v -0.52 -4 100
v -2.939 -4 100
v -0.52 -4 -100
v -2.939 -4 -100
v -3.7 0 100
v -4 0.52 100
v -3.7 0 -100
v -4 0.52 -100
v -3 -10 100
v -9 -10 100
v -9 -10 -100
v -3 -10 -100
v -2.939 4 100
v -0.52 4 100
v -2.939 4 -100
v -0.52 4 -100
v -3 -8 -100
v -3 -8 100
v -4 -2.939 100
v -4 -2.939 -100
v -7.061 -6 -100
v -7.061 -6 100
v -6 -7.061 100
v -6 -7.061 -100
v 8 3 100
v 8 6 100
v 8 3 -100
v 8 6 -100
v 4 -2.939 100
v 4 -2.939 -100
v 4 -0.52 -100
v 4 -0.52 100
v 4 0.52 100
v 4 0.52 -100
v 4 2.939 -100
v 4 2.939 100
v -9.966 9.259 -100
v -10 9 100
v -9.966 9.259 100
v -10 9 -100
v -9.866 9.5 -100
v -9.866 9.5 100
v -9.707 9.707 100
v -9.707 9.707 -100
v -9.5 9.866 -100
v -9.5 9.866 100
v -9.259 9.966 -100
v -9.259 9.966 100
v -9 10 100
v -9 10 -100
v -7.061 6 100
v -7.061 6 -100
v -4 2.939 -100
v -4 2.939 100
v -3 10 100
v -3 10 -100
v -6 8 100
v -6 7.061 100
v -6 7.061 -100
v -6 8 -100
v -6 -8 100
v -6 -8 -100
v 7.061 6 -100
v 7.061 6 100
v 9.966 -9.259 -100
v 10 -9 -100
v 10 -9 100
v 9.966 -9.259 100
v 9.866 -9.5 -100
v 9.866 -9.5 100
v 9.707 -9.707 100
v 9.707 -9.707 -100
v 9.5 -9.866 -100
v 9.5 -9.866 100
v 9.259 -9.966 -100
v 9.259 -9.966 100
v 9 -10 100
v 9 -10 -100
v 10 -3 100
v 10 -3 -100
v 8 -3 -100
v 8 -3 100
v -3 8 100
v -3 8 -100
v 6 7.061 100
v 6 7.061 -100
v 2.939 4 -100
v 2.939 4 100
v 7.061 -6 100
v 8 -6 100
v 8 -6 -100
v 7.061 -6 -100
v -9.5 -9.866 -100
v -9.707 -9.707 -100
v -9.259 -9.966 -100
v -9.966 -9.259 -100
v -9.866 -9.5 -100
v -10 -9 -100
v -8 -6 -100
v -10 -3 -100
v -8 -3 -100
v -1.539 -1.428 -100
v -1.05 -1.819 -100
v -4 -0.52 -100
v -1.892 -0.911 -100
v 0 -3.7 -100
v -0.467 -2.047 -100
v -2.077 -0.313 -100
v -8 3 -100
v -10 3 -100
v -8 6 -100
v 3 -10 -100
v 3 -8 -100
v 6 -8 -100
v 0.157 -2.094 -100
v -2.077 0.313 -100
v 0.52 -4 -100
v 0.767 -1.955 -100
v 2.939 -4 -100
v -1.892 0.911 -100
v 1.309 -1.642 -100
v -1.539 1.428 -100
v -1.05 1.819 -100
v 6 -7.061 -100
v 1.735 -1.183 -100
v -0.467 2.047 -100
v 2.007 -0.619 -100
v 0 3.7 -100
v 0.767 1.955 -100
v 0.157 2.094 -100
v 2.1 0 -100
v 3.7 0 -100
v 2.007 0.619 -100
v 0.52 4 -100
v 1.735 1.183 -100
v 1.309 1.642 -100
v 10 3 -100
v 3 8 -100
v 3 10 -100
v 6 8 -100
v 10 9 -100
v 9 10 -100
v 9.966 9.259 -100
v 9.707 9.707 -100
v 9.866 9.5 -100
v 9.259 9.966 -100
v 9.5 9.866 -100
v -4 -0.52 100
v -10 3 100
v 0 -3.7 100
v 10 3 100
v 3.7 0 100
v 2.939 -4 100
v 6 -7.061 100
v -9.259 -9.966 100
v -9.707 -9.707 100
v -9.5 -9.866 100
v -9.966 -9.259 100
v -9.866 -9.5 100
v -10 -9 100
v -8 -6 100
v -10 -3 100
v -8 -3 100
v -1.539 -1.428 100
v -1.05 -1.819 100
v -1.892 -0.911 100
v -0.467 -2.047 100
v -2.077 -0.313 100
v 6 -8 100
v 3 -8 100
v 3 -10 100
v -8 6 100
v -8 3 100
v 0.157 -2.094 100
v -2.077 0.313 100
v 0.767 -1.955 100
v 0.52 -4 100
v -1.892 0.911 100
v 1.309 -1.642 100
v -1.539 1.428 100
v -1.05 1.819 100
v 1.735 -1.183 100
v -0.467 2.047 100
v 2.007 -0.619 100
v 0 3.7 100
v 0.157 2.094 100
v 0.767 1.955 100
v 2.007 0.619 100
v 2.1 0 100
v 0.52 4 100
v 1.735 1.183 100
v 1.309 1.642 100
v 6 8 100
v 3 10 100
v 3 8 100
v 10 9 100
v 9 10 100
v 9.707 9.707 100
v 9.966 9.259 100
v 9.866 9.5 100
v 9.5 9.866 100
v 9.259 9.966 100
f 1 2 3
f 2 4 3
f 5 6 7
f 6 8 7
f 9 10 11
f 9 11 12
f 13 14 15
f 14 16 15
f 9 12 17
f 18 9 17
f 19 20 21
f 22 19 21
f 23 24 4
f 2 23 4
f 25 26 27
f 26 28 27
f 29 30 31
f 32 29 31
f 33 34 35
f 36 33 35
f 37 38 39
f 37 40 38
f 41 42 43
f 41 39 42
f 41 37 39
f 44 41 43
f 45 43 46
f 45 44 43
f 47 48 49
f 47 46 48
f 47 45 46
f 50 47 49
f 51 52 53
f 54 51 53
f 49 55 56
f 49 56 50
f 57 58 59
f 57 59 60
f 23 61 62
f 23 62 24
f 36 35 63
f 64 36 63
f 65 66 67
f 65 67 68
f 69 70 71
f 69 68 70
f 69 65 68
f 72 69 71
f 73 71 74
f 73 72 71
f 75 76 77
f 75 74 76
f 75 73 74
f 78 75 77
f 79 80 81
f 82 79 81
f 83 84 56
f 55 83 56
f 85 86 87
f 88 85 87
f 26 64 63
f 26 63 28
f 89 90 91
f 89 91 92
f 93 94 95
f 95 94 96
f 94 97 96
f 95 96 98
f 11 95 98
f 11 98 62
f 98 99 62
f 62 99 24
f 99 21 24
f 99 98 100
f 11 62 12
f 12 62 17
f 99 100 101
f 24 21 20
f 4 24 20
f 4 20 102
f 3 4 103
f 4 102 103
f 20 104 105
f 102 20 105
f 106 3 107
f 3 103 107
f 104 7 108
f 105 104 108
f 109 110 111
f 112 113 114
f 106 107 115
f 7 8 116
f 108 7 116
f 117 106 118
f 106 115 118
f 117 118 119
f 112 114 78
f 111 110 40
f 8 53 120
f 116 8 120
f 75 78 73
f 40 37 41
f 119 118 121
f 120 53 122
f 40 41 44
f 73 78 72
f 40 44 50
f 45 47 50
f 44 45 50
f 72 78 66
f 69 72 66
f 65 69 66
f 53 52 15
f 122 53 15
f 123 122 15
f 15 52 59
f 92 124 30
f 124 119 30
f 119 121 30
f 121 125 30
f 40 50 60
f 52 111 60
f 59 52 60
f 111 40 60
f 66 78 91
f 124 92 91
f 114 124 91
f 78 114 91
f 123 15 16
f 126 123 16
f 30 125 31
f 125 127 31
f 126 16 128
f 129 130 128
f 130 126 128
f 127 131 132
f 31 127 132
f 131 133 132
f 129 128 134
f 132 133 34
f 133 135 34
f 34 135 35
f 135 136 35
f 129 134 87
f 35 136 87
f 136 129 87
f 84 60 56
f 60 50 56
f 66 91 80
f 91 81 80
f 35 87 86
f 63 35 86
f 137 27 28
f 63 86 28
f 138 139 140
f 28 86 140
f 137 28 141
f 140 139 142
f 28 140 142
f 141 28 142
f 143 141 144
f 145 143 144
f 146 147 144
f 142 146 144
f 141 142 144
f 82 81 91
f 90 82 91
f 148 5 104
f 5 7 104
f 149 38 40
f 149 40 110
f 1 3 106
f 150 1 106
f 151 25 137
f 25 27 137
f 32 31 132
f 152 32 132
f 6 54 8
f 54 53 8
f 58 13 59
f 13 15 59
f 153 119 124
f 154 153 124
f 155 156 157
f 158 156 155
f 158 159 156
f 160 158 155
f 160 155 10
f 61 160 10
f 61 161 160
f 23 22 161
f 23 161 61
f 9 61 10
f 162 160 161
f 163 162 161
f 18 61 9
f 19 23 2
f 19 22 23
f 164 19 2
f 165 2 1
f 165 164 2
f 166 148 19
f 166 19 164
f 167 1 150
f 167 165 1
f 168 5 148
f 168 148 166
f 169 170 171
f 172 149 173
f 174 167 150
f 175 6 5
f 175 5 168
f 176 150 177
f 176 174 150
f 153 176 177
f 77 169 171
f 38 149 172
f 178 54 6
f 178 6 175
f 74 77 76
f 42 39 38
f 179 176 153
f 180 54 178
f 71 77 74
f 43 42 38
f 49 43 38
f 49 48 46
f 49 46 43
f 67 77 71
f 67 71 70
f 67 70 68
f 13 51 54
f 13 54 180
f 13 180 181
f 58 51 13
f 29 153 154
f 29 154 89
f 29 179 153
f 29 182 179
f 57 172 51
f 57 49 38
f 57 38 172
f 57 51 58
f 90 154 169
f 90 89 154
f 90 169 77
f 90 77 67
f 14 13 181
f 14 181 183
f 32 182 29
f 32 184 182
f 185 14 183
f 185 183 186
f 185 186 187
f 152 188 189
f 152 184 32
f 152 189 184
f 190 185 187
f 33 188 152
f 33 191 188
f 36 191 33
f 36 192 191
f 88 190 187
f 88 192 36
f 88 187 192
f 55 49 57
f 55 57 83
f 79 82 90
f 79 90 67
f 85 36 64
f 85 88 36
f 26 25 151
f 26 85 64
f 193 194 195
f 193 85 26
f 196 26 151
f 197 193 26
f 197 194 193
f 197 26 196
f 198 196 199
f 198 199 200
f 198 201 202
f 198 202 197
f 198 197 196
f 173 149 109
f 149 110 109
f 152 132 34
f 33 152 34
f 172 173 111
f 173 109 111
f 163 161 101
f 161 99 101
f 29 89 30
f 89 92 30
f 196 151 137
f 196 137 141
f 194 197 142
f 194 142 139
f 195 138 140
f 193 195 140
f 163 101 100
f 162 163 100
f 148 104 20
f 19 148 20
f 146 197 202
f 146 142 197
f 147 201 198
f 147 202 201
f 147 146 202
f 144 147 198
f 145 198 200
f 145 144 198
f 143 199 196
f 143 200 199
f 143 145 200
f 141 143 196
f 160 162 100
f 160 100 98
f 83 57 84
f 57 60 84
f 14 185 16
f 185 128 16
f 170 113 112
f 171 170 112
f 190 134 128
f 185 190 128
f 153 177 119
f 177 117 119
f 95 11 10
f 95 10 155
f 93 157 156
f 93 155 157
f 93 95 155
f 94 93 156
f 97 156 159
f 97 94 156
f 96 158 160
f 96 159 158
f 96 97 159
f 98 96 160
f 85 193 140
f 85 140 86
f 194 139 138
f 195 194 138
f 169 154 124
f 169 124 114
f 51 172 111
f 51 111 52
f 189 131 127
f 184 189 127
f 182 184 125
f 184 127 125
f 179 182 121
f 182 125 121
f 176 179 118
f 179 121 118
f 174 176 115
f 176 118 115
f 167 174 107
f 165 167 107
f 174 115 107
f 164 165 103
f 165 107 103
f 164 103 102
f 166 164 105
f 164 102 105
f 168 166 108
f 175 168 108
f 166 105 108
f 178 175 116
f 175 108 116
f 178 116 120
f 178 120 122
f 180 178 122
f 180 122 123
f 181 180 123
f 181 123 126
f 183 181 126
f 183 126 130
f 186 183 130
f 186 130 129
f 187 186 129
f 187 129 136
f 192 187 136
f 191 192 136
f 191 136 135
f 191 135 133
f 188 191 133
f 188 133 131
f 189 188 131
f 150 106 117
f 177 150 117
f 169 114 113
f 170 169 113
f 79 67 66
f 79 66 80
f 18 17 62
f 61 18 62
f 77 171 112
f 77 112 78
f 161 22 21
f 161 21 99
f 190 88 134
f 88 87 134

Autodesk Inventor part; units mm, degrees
ref_plane "YZ Plane" through (0, 0, 0) normal (1, 0, 0) x (0, 1, 0)
ref_plane "XZ Plane" through (0, 0, 0) normal (0, 1, 0) x (-1, 0, 0)
ref_plane "XY Plane" through (0, 0, 0) normal (0, 0, 1) x (1, 0, 0)
sketch "Sketch1" plane through (0, 0, 0) normal (0, 0, 1) x (1, 0, 0)
  line L0 (-2.205, 0) -> (2.205, 0)
  line L1 (0, -2.205) -> (0, 2.205)
  arc A0 (9, -10) -> (10, -9) centre (9, -9) ccw
  line L2 (-10, 9) -> (-10, 3)
  line L3 (-10, 3) -> (-8, 3)
  line L4 (-8, 3) -> (-8, 6)
  line L5 (-8, 6) -> (-7.0607, 6)
  line L6 (-7.0607, 6) -> (-4, 2.9393)
  line L7 (-4, 2.9393) -> (-4, 0.5196)
  line L8 (-4, 0.5196) -> (-3.7, 0)
  line L9 (-3.7, 0) -> (-4, -0.5196)
  line L10 (-4, -0.5196) -> (-4, -2.9393)
  line L11 (-4, -2.9393) -> (-7.0607, -6)
  line L12 (-7.0607, -6) -> (-8, -6)
  line L13 (-8, -6) -> (-8, -3)
  line L14 (-8, -3) -> (-10, -3)
  line L15 (-10, -3) -> (-10, -9)
  arc A1 (-10, -9) -> (-9, -10) centre (-9, -9) ccw
  line L16 (-9, -10) -> (-3, -10)
  line L17 (-3, -10) -> (-3, -8)
  line L18 (-3, -8) -> (-6, -8)
  line L19 (-6, -7.0607) -> (-2.9393, -4)
  line L20 (-2.9393, -4) -> (-0.5196, -4)
  line L21 (-0.5196, -4) -> (0, -3.7)
  line L22 (0, -3.7) -> (0.5196, -4)
  line L23 (0.5196, -4) -> (2.9393, -4)
  line L24 (2.9393, -4) -> (6, -7.0607)
  line L25 (6, -7.0607) -> (6, -8)
  line L26 (6, -8) -> (3, -8)
  line L27 (3, -8) -> (3, -10)
  line L28 (3, -10) -> (9, -10)
  line L29 (10, -9) -> (10, -3)
  line L30 (10, -3) -> (8, -3)
  line L31 (8, -3) -> (8, -6)
  line L32 (8, -6) -> (7.0607, -6)
  line L33 (7.0607, -6) -> (4, -2.9393)
  line L34 (4, -2.9393) -> (4, -0.5196)
  line L35 (4, -0.5196) -> (3.7, 0)
  line L36 (3.7, 0) -> (4, 0.5196)
  line L37 (4, 0.5196) -> (4, 2.9393)
  line L38 (4, 2.9393) -> (7.0607, 6)
  line L39 (7.0607, 6) -> (8, 6)
  line L40 (8, 6) -> (8, 3)
  line L41 (8, 3) -> (10, 3)
  line L42 (10, 3) -> (10, 9)
  arc A2 (10, 9) -> (9, 10) centre (9, 9) ccw
  line L43 (9, 10) -> (3, 10)
  line L44 (3, 10) -> (3, 8)
  line L45 (3, 8) -> (6, 8)
  line L46 (6, 8) -> (6, 7.0607)
  line L47 (6, 7.0607) -> (2.9393, 4)
  line L48 (2.9393, 4) -> (0.5196, 4)
  line L49 (0.5196, 4) -> (0, 3.7)
  line L50 (0, 3.7) -> (-0.5196, 4)
  line L51 (-0.5196, 4) -> (-2.9393, 4)
  line L52 (-2.9393, 4) -> (-6, 7.0607)
  line L53 (-6, 7.0607) -> (-6, 8)
  line L54 (-6, 8) -> (-3, 8)
  line L55 (-3, 8) -> (-3, 10)
  line L56 (-3, 10) -> (-9, 10)
  arc A3 (-9, 10) -> (-10, 9) centre (-9, 9) ccw
  circle A4 centre (0, 0) radius 2.1
  line L57 (-6, -8) -> (-6, -7.0607)
extrude "Extrusion1" add sketch "Sketch1" along normal mid plane 200
properties part number "15 cm extrusion" material "Aluminum 6061"
